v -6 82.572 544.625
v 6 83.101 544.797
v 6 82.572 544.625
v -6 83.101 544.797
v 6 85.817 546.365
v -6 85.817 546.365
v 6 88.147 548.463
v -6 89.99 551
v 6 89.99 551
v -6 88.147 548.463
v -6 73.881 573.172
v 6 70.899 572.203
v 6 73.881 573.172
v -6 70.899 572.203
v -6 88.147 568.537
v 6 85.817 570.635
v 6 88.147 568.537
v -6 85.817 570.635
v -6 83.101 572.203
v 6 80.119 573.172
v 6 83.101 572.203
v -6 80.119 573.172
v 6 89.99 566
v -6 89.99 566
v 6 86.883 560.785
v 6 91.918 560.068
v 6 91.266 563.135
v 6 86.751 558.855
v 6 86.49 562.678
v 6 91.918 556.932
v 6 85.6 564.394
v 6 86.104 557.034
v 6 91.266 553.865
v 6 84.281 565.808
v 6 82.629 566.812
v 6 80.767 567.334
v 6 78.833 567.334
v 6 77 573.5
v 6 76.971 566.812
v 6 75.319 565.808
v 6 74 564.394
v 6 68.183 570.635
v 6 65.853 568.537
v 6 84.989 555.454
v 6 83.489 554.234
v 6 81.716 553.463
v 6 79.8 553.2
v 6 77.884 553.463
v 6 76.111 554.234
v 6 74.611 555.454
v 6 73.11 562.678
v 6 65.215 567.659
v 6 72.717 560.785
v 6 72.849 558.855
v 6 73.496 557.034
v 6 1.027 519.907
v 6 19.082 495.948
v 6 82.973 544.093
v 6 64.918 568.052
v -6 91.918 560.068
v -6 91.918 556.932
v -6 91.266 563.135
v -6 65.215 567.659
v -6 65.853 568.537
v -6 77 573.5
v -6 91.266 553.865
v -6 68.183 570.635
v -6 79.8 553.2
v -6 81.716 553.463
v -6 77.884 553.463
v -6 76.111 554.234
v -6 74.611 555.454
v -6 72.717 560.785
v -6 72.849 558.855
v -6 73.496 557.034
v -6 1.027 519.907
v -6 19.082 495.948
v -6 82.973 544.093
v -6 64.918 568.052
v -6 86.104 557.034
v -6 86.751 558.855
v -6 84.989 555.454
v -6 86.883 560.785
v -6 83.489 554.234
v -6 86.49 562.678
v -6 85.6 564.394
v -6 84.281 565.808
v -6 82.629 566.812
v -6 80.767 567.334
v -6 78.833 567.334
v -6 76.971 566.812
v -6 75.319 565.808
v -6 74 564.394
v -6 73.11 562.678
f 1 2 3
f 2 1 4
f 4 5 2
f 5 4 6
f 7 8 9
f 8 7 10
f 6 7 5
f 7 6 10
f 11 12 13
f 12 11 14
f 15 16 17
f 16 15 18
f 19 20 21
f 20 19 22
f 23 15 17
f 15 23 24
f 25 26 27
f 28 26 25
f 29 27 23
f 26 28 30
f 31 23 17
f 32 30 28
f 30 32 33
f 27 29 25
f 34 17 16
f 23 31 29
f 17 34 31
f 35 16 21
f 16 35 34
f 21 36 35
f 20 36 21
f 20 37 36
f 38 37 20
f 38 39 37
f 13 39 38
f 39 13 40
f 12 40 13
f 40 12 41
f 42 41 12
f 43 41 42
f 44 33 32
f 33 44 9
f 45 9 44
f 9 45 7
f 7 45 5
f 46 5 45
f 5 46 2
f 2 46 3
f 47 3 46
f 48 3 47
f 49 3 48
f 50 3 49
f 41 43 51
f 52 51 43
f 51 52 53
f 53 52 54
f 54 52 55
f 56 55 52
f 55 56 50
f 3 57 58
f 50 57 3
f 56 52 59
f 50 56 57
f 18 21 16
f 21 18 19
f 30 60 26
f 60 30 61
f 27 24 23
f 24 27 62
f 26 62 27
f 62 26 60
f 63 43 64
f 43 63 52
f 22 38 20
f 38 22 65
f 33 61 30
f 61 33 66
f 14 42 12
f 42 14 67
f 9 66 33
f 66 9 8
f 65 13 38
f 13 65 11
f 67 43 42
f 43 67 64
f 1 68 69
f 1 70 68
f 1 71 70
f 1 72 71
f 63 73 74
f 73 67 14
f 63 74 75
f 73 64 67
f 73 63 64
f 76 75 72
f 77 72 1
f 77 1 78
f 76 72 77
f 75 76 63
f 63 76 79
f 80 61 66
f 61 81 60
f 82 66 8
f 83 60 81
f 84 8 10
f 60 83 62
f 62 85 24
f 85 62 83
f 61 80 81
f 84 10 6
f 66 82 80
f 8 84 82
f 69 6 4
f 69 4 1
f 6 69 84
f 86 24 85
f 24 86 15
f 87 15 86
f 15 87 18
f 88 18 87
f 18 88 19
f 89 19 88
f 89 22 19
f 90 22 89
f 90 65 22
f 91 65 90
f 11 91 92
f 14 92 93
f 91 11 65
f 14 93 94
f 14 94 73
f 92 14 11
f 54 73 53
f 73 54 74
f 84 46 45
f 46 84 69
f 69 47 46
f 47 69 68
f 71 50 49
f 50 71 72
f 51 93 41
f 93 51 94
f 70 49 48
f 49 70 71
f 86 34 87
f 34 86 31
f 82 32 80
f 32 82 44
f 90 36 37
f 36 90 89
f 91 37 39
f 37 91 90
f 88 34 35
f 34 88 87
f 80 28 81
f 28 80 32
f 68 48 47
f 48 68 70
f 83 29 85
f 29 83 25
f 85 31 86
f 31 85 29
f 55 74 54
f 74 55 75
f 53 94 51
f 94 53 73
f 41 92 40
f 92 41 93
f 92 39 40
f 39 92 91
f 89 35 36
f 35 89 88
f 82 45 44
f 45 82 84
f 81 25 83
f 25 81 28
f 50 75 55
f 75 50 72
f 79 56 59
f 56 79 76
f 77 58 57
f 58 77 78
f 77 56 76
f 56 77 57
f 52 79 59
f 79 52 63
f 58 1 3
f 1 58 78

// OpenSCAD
// === STL Reference (visual only, not exported) ===
// %scale(1000) import("l2cam.stl");

// === Cam Bar ===
cam_bar_dim    = [12, 80, 30];
cam_bar_angle  = 37;
cam_bar_pos    = [0, 42, 532];

translate(cam_bar_pos)
    rotate([cam_bar_angle, 0, 0])
        cube(cam_bar_dim, center = true);

// === Cam Hole Assembly ===
cam_hole_pos         = [0, 77, 558.5];
cam_outer_radius     = 15;
cam_outer_depth      = 12;

inner_hole_radius    = 7.1;
inner_hole_offset    = [-1.8, 2.8, 0];
inner_hole_depth     = 13;

translate(cam_hole_pos)
    rotate([0, 90, 0])
        difference() {
            cylinder(r = cam_outer_radius, h = cam_outer_depth, center = true);
            translate(inner_hole_offset)
                cylinder(r = inner_hole_radius, h = inner_hole_depth, center = true);
        }
